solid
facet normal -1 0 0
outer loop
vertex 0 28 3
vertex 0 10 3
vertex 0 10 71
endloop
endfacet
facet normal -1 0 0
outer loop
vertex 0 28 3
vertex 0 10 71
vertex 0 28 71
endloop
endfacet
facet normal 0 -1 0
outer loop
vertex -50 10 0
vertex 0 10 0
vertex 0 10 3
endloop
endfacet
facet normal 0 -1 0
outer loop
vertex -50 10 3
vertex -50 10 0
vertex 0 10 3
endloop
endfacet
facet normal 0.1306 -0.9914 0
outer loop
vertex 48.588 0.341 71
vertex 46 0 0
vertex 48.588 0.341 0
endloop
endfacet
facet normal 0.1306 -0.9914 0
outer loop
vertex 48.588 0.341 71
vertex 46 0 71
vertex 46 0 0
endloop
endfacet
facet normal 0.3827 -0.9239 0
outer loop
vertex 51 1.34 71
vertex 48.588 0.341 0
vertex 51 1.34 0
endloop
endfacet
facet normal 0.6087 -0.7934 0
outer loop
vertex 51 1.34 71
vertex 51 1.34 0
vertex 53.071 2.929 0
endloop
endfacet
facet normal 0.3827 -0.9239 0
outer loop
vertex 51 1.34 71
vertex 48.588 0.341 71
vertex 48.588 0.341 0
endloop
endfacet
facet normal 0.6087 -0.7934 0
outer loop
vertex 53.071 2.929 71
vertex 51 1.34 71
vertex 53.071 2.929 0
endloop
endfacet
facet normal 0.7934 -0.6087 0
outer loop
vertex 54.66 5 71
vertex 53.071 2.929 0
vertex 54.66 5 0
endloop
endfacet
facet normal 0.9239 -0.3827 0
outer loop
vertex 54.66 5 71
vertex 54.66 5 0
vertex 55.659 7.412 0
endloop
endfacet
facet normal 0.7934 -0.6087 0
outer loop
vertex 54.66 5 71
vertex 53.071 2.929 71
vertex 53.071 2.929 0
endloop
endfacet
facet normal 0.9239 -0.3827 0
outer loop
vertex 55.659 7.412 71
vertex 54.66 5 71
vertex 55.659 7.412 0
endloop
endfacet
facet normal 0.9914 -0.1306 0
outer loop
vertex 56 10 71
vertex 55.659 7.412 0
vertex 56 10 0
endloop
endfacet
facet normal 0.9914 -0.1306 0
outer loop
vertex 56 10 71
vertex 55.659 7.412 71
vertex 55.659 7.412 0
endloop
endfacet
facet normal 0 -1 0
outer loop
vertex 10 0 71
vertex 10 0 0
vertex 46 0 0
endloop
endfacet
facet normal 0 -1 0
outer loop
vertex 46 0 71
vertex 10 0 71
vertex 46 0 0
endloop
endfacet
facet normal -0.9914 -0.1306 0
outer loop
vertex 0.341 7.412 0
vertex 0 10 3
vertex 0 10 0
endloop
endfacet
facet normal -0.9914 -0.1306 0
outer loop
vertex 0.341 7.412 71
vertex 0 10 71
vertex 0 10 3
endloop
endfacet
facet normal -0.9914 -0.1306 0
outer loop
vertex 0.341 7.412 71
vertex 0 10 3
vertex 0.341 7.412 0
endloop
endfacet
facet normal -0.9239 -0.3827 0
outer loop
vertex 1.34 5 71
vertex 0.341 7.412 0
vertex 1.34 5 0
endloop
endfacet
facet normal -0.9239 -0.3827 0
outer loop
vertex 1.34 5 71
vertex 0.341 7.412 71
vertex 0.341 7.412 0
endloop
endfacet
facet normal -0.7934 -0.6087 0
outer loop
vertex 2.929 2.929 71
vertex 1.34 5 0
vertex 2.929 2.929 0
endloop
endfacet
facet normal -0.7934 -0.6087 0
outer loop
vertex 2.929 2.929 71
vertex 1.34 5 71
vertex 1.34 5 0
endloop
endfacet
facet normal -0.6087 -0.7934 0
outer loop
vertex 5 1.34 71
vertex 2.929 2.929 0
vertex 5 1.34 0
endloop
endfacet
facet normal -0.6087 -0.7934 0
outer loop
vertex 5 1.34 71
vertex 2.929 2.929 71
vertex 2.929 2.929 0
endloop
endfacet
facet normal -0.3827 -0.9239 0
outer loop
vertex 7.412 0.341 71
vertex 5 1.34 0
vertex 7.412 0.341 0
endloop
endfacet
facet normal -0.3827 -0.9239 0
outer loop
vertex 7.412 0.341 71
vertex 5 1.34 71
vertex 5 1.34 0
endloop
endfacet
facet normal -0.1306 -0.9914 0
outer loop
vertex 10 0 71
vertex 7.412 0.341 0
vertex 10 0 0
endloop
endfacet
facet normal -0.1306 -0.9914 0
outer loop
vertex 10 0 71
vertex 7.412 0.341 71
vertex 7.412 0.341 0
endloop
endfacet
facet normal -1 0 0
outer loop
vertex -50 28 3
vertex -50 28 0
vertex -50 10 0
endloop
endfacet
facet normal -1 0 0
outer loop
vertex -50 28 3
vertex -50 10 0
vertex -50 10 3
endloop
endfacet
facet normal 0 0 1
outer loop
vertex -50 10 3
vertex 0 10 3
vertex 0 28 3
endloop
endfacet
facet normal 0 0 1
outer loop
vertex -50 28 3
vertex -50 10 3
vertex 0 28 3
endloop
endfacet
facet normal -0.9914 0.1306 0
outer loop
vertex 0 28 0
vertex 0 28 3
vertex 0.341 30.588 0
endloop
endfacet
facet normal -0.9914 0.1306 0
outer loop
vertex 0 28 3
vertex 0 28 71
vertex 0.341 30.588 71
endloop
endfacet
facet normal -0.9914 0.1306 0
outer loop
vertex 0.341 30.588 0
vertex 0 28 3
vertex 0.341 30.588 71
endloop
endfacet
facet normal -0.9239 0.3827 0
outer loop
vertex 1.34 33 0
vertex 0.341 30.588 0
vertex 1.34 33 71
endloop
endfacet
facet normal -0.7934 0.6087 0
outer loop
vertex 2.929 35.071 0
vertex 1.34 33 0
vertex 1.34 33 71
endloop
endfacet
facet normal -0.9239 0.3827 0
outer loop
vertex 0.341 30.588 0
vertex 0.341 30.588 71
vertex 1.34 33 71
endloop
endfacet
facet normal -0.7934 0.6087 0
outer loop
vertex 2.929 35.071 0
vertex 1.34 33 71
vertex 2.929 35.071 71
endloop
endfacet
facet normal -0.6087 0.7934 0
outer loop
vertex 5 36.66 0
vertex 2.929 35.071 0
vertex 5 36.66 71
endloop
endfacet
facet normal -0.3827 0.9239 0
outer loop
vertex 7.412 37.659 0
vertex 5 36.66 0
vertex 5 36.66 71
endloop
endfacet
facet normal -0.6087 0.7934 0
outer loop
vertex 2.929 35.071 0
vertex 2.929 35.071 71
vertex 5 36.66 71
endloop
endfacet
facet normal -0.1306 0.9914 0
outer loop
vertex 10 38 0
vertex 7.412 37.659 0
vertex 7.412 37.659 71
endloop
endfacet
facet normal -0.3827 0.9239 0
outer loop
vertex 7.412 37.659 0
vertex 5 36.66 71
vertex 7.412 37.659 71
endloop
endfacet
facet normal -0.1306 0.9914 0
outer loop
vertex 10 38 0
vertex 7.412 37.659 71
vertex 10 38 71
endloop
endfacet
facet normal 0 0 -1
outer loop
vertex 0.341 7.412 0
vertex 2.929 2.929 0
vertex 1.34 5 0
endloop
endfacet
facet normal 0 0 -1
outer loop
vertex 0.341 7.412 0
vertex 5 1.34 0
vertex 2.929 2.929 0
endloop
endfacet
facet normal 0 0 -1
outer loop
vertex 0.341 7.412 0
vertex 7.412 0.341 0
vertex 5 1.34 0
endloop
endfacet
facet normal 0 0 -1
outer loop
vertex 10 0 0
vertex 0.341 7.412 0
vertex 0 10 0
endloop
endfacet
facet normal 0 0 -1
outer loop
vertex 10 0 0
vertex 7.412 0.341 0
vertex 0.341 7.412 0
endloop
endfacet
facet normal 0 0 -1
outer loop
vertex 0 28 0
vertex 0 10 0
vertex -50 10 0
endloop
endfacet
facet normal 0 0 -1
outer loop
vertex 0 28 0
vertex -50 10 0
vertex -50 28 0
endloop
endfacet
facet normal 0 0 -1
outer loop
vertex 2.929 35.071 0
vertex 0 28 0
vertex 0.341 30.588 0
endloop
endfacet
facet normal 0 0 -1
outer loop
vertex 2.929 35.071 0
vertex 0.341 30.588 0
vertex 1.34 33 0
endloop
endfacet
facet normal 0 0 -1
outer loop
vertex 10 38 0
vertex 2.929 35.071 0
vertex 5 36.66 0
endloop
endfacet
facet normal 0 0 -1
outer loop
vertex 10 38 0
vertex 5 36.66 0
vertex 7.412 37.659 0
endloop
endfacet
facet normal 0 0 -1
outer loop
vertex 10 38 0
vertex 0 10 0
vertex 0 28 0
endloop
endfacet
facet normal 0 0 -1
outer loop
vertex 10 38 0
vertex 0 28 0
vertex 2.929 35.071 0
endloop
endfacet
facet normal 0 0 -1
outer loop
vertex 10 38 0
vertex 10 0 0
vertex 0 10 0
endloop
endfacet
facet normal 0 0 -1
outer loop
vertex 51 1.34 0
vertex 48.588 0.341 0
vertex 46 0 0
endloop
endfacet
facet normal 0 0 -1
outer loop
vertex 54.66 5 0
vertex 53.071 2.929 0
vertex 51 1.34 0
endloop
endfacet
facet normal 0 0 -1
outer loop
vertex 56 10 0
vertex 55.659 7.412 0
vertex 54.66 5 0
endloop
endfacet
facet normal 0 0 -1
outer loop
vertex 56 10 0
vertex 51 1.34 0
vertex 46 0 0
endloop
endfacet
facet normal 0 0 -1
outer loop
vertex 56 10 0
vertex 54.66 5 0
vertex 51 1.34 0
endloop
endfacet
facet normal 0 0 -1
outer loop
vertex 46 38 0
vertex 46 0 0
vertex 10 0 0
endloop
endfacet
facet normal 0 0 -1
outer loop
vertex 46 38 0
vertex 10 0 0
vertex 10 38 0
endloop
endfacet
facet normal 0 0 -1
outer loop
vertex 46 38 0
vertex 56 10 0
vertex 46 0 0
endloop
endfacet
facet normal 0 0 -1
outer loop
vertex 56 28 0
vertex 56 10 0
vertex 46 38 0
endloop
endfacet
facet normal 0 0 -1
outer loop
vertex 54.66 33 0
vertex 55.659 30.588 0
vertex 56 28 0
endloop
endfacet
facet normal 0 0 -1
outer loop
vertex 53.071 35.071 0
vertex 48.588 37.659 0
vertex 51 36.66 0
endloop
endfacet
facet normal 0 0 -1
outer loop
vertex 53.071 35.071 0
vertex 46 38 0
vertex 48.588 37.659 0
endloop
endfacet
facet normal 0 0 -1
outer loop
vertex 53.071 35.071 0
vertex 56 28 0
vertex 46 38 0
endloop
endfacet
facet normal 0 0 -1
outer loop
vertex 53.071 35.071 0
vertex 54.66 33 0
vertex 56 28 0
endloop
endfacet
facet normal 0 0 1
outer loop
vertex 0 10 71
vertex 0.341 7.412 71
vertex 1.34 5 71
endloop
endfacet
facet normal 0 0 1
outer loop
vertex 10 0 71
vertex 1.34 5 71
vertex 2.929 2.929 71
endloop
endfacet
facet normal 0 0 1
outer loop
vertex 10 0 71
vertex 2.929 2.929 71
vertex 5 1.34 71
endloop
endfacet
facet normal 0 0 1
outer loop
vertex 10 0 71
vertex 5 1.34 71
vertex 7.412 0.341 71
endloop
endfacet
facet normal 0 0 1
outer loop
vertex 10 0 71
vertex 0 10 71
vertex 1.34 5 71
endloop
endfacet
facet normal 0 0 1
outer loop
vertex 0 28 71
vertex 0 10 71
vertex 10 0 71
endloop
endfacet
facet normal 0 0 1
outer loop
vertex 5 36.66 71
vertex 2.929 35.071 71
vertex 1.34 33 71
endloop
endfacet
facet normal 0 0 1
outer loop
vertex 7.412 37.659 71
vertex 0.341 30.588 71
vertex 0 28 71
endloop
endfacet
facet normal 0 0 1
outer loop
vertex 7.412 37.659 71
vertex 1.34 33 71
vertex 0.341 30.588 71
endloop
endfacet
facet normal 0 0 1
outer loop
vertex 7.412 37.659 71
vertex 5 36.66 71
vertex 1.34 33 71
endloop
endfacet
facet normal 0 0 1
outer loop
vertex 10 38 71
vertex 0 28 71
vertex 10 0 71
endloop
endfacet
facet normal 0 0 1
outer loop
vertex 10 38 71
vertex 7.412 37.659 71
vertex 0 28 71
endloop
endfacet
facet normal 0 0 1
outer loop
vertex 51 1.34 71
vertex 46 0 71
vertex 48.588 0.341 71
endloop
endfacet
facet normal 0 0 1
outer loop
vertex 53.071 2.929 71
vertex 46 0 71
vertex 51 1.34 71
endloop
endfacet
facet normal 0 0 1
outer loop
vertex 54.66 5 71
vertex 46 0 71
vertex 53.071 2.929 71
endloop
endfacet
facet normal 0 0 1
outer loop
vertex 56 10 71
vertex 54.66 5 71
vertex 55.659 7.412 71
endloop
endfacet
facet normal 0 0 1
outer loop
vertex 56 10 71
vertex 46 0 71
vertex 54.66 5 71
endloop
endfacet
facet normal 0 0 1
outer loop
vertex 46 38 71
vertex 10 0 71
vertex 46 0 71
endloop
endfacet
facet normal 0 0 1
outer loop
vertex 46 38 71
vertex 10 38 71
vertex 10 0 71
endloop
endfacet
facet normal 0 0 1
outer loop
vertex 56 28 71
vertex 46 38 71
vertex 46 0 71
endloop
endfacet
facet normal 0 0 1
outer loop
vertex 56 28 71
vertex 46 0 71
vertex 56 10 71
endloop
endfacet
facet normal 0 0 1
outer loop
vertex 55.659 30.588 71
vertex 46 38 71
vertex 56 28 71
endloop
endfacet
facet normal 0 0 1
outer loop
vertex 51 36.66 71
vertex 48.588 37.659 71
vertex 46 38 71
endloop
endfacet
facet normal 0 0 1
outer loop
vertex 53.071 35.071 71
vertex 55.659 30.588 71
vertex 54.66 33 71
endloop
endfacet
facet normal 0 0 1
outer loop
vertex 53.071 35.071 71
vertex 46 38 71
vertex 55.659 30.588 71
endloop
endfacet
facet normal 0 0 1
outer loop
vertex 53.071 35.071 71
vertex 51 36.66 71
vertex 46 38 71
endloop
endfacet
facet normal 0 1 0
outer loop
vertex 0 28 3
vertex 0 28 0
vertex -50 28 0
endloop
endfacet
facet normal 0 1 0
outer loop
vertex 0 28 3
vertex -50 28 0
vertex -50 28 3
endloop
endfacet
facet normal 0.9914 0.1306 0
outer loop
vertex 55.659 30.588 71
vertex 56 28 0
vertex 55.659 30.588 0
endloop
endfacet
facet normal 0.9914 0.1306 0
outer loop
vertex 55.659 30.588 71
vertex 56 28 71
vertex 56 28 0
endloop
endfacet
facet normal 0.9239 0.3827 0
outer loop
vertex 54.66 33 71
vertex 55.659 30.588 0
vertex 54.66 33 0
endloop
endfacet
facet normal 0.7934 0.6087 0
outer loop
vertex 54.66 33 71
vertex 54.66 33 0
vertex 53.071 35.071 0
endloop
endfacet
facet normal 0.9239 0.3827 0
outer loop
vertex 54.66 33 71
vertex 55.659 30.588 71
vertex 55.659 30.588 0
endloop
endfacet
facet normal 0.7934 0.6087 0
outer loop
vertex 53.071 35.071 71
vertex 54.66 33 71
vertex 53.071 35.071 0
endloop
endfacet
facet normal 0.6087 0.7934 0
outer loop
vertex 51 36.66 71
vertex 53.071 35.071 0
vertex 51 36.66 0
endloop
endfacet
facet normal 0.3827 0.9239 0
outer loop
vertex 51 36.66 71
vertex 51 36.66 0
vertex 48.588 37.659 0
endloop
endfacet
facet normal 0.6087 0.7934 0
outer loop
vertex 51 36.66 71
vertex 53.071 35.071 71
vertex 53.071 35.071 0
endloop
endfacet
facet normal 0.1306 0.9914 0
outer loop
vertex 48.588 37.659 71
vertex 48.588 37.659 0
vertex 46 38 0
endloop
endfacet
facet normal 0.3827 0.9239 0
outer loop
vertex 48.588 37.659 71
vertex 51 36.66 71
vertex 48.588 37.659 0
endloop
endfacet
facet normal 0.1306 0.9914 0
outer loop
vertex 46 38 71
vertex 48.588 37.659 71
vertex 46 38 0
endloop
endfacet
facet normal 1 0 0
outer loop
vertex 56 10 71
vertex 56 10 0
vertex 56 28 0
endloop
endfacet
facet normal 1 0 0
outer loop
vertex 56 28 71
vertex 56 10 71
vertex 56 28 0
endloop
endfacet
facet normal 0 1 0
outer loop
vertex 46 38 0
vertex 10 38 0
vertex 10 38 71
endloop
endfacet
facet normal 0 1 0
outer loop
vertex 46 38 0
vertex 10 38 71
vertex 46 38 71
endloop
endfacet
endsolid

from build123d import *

# Parameters (mm, degrees)
SKETCH_1_W      = 56
SKETCH_1_H      = 38
EXTRUDE_1_DEPTH = 71
FILLET_1_R      = 10
SKETCH_2_W      = 3
SKETCH_2_H      = 18
EXTRUDE_2_DEPTH = 50


with BuildPart() as part:
    # 草图1 → 凸台-拉伸1 (new body)
    with BuildSketch(Plane.XY):
        with Locations((28, 19)):
            Rectangle(SKETCH_1_W, SKETCH_1_H)
    extrude(amount=EXTRUDE_1_DEPTH)

    # 圆角1
    fillet_1_edges = [part.edges().sort_by_distance(p)[0] for p in [
        (0, 38, 35.5),
        (56, 38, 35.5),
        (56, 0, 35.5),
        (0, 0, 35.5),
    ]]
    fillet(fillet_1_edges, radius=FILLET_1_R)

    # 草图2 → 凸台-拉伸2 (add)
    with BuildSketch(Plane.ZY):
        with Locations((1.5, 19)):
            Rectangle(SKETCH_2_W, SKETCH_2_H)
    extrude(amount=EXTRUDE_2_DEPTH)


solid = part.part
